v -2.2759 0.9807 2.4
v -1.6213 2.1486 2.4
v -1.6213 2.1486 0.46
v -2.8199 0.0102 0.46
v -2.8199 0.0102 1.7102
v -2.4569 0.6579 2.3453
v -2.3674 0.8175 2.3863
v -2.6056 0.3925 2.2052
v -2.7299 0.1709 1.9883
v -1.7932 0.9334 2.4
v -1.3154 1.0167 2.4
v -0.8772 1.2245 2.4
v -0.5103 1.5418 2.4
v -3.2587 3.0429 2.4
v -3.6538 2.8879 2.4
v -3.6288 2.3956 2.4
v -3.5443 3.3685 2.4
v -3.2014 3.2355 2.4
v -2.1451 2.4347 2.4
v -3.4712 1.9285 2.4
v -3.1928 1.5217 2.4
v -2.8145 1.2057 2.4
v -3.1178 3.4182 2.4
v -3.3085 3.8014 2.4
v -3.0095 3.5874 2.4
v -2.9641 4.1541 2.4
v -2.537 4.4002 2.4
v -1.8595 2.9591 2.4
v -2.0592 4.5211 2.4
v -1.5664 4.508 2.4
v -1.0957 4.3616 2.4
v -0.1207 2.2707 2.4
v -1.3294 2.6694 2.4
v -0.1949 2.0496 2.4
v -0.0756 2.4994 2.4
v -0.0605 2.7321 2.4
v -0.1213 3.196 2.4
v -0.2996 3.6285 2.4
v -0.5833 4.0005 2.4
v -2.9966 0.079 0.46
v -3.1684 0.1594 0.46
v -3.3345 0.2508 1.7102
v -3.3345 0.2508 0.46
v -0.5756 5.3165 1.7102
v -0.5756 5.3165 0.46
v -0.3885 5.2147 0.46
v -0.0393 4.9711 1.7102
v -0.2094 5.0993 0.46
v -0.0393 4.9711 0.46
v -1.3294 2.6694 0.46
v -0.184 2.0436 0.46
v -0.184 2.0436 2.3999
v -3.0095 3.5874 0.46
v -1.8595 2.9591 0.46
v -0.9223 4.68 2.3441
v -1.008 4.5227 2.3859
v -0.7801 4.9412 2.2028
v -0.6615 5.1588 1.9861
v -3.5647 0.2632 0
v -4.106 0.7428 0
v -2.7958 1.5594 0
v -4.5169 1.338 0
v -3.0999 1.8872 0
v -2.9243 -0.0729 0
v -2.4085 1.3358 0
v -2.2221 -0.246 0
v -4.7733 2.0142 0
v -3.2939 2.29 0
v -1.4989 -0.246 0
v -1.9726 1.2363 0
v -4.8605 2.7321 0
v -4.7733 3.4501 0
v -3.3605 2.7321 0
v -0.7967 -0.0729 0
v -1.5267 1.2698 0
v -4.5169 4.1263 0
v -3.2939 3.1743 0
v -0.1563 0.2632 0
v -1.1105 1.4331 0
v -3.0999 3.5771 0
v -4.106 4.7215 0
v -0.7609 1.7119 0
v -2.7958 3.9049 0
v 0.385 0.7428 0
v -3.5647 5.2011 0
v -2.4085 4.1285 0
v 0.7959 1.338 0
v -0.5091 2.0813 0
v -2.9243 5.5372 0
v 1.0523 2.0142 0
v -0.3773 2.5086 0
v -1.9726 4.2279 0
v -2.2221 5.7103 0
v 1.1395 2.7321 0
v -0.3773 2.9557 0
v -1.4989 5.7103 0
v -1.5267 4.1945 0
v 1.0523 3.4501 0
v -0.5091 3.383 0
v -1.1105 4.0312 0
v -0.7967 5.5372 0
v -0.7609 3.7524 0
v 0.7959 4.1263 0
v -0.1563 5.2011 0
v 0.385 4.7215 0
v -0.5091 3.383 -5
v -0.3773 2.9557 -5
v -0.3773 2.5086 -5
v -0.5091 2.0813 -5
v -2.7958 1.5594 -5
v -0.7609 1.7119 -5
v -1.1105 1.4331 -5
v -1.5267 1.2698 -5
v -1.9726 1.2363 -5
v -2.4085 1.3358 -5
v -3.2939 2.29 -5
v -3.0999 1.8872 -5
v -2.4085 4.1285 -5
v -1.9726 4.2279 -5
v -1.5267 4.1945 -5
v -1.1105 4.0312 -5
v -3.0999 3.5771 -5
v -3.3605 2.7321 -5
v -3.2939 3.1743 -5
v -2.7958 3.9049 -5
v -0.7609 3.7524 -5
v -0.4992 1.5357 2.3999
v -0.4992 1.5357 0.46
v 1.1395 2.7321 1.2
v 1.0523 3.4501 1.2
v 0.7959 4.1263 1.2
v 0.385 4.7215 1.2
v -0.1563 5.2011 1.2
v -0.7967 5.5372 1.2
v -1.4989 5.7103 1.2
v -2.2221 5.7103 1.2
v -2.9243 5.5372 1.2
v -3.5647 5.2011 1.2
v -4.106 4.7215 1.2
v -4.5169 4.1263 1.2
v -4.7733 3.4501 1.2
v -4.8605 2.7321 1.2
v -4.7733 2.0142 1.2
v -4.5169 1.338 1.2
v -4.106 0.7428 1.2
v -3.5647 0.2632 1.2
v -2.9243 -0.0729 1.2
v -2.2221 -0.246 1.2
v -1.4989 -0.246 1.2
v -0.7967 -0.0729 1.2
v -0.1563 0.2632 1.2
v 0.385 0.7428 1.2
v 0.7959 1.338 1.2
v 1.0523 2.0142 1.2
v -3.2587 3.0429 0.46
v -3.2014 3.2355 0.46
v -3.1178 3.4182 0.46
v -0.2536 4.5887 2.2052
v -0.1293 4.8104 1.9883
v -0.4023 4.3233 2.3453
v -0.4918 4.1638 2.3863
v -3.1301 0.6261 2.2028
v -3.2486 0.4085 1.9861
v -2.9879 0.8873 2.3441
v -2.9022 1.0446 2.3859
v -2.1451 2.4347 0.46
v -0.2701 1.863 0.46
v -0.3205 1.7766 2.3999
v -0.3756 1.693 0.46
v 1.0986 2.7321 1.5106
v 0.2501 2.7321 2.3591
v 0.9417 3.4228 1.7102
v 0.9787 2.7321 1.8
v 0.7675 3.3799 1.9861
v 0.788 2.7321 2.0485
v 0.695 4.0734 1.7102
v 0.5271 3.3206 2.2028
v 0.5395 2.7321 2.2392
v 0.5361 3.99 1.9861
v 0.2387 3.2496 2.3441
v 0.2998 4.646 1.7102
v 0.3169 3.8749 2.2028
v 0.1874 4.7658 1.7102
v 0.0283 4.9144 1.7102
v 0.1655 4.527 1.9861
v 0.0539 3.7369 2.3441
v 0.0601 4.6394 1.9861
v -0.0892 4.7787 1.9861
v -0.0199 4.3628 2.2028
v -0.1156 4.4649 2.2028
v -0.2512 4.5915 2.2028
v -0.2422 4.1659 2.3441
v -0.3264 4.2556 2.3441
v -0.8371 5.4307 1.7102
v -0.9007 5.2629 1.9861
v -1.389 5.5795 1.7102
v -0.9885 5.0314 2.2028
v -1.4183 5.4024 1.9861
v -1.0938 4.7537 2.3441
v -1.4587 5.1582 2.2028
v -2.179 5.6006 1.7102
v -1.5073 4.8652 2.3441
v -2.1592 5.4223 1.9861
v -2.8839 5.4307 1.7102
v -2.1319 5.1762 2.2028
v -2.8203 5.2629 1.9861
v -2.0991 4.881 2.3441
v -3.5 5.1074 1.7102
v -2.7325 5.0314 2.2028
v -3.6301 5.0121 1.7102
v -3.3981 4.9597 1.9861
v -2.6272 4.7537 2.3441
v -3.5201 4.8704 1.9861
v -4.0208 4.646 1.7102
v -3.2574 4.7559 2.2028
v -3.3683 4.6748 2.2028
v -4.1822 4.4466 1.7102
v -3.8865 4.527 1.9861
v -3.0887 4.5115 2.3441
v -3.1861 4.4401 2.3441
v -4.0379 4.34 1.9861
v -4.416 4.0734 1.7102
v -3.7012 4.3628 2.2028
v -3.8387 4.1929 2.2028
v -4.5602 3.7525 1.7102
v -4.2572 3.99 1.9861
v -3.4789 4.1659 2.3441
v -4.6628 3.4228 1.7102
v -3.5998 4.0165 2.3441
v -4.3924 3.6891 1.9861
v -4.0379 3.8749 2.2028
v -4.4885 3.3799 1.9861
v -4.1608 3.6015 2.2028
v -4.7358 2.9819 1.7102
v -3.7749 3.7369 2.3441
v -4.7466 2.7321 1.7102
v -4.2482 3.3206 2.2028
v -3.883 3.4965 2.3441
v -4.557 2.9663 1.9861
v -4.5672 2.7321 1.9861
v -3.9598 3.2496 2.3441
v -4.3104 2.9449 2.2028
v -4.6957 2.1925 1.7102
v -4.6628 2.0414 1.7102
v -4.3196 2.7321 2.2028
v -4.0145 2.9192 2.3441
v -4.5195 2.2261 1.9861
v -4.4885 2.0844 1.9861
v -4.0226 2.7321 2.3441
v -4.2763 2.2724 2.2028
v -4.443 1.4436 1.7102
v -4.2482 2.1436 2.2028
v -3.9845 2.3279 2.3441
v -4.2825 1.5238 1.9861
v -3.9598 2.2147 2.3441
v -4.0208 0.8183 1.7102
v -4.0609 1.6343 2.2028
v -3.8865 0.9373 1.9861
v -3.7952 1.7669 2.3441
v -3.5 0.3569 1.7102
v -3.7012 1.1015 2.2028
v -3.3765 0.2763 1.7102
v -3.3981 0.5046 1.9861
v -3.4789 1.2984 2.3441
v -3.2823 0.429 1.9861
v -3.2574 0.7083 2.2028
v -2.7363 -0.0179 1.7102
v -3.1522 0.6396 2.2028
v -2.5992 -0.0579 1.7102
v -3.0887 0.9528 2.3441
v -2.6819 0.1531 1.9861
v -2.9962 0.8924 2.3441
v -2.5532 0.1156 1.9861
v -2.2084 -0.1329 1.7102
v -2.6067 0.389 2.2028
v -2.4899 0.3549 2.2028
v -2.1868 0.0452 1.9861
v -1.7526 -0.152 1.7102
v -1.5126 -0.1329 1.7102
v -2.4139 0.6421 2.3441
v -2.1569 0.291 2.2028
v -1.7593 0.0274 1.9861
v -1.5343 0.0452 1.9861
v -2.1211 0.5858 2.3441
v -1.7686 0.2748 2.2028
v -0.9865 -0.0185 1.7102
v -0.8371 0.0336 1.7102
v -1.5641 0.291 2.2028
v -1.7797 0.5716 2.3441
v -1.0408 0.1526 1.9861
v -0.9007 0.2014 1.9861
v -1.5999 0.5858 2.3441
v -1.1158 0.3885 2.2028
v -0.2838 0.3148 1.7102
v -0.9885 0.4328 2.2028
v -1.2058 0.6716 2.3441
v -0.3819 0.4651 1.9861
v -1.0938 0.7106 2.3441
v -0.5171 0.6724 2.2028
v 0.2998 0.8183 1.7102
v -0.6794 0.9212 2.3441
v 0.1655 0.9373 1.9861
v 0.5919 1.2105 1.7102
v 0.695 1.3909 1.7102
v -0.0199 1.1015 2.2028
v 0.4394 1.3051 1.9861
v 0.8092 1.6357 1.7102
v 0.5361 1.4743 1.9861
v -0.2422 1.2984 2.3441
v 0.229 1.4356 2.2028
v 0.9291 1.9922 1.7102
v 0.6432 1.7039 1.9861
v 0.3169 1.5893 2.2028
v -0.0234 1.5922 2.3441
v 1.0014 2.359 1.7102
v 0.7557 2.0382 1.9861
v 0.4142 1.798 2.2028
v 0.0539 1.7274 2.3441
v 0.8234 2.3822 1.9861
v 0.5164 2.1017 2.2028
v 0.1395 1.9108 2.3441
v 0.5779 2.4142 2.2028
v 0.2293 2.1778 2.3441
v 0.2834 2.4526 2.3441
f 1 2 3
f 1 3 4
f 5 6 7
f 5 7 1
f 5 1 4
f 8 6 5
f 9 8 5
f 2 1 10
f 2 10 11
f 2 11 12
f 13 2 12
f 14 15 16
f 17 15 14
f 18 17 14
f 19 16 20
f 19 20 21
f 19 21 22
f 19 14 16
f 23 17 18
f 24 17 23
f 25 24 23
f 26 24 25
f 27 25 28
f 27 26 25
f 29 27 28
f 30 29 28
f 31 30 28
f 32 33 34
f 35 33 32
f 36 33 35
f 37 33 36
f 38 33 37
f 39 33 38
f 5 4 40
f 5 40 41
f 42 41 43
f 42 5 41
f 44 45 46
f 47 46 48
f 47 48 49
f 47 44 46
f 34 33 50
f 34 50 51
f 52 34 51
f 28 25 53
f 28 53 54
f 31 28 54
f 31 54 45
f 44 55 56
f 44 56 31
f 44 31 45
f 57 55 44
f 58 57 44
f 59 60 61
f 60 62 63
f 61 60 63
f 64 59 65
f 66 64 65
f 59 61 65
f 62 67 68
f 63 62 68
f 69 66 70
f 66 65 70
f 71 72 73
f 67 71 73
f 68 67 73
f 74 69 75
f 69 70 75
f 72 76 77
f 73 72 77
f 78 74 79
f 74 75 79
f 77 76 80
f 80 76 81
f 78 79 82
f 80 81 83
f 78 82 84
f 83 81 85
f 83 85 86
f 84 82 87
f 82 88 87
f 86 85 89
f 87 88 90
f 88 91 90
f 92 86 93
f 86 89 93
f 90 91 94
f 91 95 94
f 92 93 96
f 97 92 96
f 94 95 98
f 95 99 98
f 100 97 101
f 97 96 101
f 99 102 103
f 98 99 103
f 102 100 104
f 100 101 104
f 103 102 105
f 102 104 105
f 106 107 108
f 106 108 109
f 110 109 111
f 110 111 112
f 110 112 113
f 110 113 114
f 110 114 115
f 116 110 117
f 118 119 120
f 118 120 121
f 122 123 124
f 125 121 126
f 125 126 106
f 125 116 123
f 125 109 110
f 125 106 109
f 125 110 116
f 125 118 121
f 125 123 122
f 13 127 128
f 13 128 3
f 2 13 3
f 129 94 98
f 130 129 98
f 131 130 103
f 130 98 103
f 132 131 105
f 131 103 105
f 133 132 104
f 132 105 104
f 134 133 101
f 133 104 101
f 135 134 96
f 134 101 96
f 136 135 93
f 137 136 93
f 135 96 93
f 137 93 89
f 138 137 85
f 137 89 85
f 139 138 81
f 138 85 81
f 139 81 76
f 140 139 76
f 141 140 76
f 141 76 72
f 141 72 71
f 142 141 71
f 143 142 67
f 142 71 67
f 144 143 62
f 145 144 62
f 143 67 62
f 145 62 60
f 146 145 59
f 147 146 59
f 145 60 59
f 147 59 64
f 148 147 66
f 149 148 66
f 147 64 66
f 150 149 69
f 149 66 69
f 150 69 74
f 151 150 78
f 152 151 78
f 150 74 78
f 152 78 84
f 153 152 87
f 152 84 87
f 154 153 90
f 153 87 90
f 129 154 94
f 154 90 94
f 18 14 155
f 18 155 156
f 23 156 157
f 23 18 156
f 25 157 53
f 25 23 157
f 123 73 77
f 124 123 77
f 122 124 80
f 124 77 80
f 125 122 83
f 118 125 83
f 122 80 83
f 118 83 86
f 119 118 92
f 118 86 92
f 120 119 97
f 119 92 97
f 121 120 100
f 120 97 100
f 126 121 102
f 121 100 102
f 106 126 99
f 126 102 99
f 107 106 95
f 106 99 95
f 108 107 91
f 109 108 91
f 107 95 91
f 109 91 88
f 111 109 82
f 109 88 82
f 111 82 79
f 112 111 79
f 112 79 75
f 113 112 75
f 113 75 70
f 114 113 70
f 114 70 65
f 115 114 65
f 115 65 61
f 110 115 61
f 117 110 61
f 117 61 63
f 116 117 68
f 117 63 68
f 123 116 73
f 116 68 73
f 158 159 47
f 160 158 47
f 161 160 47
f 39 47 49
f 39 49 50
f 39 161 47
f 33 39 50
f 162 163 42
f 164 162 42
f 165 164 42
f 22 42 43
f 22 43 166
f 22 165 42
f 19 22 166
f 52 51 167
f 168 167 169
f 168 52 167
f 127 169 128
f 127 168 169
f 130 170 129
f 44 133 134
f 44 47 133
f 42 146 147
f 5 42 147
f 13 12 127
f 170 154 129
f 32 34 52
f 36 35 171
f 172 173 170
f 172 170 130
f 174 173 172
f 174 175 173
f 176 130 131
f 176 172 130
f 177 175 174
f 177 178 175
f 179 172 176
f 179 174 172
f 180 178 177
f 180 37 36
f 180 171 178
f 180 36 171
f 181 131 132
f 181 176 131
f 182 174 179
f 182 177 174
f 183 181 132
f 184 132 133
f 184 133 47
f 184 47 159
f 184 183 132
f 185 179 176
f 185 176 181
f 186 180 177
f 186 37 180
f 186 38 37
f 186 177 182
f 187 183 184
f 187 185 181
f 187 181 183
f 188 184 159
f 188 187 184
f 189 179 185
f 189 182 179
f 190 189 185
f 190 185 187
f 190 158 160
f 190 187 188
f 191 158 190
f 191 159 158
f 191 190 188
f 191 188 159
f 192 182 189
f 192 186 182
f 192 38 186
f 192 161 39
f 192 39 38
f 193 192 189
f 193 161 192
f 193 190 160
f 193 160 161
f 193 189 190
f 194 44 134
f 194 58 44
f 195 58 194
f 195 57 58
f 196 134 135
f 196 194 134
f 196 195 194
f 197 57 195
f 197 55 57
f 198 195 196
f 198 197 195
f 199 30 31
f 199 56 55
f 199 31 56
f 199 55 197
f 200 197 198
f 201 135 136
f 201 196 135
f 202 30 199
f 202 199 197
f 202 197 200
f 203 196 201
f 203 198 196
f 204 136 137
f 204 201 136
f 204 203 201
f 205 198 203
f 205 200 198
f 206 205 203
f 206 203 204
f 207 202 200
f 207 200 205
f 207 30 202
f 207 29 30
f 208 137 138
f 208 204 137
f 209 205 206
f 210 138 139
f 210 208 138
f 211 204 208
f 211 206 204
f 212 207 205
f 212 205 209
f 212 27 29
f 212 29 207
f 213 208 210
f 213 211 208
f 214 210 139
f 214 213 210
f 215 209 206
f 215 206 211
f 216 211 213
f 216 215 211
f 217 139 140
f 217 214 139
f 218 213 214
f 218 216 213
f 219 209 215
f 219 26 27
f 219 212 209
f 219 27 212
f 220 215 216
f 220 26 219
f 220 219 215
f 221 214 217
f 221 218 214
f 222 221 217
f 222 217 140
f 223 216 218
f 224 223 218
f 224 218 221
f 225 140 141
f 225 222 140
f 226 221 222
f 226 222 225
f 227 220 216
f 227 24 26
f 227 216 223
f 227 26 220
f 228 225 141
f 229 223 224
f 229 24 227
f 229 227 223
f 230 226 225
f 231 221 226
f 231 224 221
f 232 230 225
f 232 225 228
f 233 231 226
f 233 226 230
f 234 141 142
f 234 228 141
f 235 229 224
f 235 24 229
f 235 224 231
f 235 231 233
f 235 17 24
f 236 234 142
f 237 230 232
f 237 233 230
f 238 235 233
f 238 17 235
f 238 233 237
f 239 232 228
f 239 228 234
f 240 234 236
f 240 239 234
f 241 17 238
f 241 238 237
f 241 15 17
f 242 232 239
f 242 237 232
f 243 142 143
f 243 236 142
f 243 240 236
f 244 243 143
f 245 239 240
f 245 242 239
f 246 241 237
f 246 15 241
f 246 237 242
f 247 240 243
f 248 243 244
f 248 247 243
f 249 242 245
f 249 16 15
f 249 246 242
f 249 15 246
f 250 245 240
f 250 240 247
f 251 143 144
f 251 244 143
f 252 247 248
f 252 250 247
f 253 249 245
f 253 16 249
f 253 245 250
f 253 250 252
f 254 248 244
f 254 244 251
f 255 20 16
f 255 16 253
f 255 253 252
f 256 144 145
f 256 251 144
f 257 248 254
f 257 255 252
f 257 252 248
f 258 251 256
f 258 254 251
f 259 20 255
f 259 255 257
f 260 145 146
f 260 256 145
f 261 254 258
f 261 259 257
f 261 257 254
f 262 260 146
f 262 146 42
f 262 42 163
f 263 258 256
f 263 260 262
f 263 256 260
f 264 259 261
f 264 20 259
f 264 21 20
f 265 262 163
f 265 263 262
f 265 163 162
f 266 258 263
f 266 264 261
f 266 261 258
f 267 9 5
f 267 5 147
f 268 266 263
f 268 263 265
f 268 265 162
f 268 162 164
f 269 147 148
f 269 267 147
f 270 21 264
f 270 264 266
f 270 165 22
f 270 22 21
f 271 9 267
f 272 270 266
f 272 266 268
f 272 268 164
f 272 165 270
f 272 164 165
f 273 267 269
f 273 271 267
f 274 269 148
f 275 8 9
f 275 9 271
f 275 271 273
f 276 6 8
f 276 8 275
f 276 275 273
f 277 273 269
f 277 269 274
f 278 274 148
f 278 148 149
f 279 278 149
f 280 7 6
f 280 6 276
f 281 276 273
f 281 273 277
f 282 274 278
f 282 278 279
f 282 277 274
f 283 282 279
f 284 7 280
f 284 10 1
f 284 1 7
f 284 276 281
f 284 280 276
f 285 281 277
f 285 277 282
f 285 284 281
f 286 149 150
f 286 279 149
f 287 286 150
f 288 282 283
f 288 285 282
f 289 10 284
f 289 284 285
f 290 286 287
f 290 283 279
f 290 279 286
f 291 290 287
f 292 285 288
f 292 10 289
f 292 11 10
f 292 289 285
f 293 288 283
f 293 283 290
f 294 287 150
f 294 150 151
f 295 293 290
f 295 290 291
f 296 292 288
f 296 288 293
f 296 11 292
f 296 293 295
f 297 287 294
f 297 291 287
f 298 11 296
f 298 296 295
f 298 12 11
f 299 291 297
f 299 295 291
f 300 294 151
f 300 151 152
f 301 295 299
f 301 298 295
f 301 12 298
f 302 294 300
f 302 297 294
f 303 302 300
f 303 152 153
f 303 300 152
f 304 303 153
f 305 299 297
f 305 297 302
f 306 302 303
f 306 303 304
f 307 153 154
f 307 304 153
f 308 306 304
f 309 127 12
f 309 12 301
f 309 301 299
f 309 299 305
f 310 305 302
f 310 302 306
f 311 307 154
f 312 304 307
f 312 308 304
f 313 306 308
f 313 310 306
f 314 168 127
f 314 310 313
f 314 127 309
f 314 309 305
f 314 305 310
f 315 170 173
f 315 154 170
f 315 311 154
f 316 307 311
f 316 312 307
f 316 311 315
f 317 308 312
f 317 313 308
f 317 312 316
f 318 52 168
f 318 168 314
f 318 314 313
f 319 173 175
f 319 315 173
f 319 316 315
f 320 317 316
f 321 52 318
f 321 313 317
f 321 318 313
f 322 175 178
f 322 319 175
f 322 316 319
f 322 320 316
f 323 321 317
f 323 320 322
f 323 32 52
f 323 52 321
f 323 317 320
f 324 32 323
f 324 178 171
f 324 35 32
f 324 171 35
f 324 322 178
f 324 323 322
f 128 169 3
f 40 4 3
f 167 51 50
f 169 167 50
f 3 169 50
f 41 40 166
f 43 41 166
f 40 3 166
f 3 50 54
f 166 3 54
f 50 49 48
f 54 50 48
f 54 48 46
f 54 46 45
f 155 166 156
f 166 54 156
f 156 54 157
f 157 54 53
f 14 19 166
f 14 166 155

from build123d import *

# Parameters (mm, degrees)
SZKIC1_R                    = 3
DODANIE_WYCI_GNI_CIE2_DEPTH = 2.4
SZKIC2_R                    = 1.5
DODANIE_WYCI_GNI_CIE3_DEPTH = 5
ZAOKR_GLENIE2_R             = 1.2
WYTNIJ_WYCI_GNI_CIE1_DEPTH  = 1.94


with BuildPart() as part:
    # Szkic1 → Dodanie-wyciągnięcie2 (new body)
    with BuildSketch(Plane.XY):
        with Locations((-1.860516246, 2.732142857)):
            Circle(SZKIC1_R)
    extrude(amount=DODANIE_WYCI_GNI_CIE2_DEPTH)

    # Szkic2 → Dodanie-wyciągnięcie3 (add)
    with BuildSketch(Plane(origin=(0, 0, 0), x_dir=(-1, 0, 0), z_dir=(0, 0, -1))):
        with Locations((1.860516246, 2.732142857)):
            Circle(SZKIC2_R)
    extrude(amount=DODANIE_WYCI_GNI_CIE3_DEPTH)

    # Zaokrąglenie2
    zaokr_glenie2_edges = [part.edges().sort_by_distance(p)[0] for p in [
        (-4.860516246, 2.732142857, 2.4),
    ]]
    fillet(zaokr_glenie2_edges, radius=ZAOKR_GLENIE2_R)

    # Szkic3 → Wytnij-wyciągnięcie1 (cut)
    with BuildSketch(Plane.XY.offset(2.4)):
        with BuildLine():
            Line((-1.859548318, 2.959091853), (-0.575649693, 5.316481314))
            ThreePointArc((-0.575649693, 5.316481314), (-0.297886623, 5.158637444), (-0.039271083, 4.97106076))
            Line((-0.039271083, 4.97106076), (-1.329373025, 2.669425378))
            Line((-1.329373025, 2.669425378), (-0.183967515, 2.043621837))
            ThreePointArc((-0.183967515, 2.043621837), (-0.320475658, 1.776553075), (-0.499159616, 1.535654258))
            Line((-0.499159616, 1.535654258), (-1.621312108, 2.148584891))
            Line((-1.621312108, 2.148584891), (-2.819933608, 0.01015725))
            ThreePointArc((-2.819933608, 0.01015725), (-3.083174674, 0.117799023), (-3.33454353, 0.250826496))
            Line((-3.33454353, 0.250826496), (-2.145142944, 2.434706401))
            Line((-2.145142944, 2.434706401), (-3.258687897, 3.042935511))
            ThreePointArc((-3.258687897, 3.042935511), (-3.162842423, 3.328316127), (-3.009463836, 3.587359481))
            Line((-3.009463836, 3.587359481), (-1.859548318, 2.959091853))
        make_face()
    extrude(amount=-WYTNIJ_WYCI_GNI_CIE1_DEPTH, mode=Mode.SUBTRACT)


solid = part.part
